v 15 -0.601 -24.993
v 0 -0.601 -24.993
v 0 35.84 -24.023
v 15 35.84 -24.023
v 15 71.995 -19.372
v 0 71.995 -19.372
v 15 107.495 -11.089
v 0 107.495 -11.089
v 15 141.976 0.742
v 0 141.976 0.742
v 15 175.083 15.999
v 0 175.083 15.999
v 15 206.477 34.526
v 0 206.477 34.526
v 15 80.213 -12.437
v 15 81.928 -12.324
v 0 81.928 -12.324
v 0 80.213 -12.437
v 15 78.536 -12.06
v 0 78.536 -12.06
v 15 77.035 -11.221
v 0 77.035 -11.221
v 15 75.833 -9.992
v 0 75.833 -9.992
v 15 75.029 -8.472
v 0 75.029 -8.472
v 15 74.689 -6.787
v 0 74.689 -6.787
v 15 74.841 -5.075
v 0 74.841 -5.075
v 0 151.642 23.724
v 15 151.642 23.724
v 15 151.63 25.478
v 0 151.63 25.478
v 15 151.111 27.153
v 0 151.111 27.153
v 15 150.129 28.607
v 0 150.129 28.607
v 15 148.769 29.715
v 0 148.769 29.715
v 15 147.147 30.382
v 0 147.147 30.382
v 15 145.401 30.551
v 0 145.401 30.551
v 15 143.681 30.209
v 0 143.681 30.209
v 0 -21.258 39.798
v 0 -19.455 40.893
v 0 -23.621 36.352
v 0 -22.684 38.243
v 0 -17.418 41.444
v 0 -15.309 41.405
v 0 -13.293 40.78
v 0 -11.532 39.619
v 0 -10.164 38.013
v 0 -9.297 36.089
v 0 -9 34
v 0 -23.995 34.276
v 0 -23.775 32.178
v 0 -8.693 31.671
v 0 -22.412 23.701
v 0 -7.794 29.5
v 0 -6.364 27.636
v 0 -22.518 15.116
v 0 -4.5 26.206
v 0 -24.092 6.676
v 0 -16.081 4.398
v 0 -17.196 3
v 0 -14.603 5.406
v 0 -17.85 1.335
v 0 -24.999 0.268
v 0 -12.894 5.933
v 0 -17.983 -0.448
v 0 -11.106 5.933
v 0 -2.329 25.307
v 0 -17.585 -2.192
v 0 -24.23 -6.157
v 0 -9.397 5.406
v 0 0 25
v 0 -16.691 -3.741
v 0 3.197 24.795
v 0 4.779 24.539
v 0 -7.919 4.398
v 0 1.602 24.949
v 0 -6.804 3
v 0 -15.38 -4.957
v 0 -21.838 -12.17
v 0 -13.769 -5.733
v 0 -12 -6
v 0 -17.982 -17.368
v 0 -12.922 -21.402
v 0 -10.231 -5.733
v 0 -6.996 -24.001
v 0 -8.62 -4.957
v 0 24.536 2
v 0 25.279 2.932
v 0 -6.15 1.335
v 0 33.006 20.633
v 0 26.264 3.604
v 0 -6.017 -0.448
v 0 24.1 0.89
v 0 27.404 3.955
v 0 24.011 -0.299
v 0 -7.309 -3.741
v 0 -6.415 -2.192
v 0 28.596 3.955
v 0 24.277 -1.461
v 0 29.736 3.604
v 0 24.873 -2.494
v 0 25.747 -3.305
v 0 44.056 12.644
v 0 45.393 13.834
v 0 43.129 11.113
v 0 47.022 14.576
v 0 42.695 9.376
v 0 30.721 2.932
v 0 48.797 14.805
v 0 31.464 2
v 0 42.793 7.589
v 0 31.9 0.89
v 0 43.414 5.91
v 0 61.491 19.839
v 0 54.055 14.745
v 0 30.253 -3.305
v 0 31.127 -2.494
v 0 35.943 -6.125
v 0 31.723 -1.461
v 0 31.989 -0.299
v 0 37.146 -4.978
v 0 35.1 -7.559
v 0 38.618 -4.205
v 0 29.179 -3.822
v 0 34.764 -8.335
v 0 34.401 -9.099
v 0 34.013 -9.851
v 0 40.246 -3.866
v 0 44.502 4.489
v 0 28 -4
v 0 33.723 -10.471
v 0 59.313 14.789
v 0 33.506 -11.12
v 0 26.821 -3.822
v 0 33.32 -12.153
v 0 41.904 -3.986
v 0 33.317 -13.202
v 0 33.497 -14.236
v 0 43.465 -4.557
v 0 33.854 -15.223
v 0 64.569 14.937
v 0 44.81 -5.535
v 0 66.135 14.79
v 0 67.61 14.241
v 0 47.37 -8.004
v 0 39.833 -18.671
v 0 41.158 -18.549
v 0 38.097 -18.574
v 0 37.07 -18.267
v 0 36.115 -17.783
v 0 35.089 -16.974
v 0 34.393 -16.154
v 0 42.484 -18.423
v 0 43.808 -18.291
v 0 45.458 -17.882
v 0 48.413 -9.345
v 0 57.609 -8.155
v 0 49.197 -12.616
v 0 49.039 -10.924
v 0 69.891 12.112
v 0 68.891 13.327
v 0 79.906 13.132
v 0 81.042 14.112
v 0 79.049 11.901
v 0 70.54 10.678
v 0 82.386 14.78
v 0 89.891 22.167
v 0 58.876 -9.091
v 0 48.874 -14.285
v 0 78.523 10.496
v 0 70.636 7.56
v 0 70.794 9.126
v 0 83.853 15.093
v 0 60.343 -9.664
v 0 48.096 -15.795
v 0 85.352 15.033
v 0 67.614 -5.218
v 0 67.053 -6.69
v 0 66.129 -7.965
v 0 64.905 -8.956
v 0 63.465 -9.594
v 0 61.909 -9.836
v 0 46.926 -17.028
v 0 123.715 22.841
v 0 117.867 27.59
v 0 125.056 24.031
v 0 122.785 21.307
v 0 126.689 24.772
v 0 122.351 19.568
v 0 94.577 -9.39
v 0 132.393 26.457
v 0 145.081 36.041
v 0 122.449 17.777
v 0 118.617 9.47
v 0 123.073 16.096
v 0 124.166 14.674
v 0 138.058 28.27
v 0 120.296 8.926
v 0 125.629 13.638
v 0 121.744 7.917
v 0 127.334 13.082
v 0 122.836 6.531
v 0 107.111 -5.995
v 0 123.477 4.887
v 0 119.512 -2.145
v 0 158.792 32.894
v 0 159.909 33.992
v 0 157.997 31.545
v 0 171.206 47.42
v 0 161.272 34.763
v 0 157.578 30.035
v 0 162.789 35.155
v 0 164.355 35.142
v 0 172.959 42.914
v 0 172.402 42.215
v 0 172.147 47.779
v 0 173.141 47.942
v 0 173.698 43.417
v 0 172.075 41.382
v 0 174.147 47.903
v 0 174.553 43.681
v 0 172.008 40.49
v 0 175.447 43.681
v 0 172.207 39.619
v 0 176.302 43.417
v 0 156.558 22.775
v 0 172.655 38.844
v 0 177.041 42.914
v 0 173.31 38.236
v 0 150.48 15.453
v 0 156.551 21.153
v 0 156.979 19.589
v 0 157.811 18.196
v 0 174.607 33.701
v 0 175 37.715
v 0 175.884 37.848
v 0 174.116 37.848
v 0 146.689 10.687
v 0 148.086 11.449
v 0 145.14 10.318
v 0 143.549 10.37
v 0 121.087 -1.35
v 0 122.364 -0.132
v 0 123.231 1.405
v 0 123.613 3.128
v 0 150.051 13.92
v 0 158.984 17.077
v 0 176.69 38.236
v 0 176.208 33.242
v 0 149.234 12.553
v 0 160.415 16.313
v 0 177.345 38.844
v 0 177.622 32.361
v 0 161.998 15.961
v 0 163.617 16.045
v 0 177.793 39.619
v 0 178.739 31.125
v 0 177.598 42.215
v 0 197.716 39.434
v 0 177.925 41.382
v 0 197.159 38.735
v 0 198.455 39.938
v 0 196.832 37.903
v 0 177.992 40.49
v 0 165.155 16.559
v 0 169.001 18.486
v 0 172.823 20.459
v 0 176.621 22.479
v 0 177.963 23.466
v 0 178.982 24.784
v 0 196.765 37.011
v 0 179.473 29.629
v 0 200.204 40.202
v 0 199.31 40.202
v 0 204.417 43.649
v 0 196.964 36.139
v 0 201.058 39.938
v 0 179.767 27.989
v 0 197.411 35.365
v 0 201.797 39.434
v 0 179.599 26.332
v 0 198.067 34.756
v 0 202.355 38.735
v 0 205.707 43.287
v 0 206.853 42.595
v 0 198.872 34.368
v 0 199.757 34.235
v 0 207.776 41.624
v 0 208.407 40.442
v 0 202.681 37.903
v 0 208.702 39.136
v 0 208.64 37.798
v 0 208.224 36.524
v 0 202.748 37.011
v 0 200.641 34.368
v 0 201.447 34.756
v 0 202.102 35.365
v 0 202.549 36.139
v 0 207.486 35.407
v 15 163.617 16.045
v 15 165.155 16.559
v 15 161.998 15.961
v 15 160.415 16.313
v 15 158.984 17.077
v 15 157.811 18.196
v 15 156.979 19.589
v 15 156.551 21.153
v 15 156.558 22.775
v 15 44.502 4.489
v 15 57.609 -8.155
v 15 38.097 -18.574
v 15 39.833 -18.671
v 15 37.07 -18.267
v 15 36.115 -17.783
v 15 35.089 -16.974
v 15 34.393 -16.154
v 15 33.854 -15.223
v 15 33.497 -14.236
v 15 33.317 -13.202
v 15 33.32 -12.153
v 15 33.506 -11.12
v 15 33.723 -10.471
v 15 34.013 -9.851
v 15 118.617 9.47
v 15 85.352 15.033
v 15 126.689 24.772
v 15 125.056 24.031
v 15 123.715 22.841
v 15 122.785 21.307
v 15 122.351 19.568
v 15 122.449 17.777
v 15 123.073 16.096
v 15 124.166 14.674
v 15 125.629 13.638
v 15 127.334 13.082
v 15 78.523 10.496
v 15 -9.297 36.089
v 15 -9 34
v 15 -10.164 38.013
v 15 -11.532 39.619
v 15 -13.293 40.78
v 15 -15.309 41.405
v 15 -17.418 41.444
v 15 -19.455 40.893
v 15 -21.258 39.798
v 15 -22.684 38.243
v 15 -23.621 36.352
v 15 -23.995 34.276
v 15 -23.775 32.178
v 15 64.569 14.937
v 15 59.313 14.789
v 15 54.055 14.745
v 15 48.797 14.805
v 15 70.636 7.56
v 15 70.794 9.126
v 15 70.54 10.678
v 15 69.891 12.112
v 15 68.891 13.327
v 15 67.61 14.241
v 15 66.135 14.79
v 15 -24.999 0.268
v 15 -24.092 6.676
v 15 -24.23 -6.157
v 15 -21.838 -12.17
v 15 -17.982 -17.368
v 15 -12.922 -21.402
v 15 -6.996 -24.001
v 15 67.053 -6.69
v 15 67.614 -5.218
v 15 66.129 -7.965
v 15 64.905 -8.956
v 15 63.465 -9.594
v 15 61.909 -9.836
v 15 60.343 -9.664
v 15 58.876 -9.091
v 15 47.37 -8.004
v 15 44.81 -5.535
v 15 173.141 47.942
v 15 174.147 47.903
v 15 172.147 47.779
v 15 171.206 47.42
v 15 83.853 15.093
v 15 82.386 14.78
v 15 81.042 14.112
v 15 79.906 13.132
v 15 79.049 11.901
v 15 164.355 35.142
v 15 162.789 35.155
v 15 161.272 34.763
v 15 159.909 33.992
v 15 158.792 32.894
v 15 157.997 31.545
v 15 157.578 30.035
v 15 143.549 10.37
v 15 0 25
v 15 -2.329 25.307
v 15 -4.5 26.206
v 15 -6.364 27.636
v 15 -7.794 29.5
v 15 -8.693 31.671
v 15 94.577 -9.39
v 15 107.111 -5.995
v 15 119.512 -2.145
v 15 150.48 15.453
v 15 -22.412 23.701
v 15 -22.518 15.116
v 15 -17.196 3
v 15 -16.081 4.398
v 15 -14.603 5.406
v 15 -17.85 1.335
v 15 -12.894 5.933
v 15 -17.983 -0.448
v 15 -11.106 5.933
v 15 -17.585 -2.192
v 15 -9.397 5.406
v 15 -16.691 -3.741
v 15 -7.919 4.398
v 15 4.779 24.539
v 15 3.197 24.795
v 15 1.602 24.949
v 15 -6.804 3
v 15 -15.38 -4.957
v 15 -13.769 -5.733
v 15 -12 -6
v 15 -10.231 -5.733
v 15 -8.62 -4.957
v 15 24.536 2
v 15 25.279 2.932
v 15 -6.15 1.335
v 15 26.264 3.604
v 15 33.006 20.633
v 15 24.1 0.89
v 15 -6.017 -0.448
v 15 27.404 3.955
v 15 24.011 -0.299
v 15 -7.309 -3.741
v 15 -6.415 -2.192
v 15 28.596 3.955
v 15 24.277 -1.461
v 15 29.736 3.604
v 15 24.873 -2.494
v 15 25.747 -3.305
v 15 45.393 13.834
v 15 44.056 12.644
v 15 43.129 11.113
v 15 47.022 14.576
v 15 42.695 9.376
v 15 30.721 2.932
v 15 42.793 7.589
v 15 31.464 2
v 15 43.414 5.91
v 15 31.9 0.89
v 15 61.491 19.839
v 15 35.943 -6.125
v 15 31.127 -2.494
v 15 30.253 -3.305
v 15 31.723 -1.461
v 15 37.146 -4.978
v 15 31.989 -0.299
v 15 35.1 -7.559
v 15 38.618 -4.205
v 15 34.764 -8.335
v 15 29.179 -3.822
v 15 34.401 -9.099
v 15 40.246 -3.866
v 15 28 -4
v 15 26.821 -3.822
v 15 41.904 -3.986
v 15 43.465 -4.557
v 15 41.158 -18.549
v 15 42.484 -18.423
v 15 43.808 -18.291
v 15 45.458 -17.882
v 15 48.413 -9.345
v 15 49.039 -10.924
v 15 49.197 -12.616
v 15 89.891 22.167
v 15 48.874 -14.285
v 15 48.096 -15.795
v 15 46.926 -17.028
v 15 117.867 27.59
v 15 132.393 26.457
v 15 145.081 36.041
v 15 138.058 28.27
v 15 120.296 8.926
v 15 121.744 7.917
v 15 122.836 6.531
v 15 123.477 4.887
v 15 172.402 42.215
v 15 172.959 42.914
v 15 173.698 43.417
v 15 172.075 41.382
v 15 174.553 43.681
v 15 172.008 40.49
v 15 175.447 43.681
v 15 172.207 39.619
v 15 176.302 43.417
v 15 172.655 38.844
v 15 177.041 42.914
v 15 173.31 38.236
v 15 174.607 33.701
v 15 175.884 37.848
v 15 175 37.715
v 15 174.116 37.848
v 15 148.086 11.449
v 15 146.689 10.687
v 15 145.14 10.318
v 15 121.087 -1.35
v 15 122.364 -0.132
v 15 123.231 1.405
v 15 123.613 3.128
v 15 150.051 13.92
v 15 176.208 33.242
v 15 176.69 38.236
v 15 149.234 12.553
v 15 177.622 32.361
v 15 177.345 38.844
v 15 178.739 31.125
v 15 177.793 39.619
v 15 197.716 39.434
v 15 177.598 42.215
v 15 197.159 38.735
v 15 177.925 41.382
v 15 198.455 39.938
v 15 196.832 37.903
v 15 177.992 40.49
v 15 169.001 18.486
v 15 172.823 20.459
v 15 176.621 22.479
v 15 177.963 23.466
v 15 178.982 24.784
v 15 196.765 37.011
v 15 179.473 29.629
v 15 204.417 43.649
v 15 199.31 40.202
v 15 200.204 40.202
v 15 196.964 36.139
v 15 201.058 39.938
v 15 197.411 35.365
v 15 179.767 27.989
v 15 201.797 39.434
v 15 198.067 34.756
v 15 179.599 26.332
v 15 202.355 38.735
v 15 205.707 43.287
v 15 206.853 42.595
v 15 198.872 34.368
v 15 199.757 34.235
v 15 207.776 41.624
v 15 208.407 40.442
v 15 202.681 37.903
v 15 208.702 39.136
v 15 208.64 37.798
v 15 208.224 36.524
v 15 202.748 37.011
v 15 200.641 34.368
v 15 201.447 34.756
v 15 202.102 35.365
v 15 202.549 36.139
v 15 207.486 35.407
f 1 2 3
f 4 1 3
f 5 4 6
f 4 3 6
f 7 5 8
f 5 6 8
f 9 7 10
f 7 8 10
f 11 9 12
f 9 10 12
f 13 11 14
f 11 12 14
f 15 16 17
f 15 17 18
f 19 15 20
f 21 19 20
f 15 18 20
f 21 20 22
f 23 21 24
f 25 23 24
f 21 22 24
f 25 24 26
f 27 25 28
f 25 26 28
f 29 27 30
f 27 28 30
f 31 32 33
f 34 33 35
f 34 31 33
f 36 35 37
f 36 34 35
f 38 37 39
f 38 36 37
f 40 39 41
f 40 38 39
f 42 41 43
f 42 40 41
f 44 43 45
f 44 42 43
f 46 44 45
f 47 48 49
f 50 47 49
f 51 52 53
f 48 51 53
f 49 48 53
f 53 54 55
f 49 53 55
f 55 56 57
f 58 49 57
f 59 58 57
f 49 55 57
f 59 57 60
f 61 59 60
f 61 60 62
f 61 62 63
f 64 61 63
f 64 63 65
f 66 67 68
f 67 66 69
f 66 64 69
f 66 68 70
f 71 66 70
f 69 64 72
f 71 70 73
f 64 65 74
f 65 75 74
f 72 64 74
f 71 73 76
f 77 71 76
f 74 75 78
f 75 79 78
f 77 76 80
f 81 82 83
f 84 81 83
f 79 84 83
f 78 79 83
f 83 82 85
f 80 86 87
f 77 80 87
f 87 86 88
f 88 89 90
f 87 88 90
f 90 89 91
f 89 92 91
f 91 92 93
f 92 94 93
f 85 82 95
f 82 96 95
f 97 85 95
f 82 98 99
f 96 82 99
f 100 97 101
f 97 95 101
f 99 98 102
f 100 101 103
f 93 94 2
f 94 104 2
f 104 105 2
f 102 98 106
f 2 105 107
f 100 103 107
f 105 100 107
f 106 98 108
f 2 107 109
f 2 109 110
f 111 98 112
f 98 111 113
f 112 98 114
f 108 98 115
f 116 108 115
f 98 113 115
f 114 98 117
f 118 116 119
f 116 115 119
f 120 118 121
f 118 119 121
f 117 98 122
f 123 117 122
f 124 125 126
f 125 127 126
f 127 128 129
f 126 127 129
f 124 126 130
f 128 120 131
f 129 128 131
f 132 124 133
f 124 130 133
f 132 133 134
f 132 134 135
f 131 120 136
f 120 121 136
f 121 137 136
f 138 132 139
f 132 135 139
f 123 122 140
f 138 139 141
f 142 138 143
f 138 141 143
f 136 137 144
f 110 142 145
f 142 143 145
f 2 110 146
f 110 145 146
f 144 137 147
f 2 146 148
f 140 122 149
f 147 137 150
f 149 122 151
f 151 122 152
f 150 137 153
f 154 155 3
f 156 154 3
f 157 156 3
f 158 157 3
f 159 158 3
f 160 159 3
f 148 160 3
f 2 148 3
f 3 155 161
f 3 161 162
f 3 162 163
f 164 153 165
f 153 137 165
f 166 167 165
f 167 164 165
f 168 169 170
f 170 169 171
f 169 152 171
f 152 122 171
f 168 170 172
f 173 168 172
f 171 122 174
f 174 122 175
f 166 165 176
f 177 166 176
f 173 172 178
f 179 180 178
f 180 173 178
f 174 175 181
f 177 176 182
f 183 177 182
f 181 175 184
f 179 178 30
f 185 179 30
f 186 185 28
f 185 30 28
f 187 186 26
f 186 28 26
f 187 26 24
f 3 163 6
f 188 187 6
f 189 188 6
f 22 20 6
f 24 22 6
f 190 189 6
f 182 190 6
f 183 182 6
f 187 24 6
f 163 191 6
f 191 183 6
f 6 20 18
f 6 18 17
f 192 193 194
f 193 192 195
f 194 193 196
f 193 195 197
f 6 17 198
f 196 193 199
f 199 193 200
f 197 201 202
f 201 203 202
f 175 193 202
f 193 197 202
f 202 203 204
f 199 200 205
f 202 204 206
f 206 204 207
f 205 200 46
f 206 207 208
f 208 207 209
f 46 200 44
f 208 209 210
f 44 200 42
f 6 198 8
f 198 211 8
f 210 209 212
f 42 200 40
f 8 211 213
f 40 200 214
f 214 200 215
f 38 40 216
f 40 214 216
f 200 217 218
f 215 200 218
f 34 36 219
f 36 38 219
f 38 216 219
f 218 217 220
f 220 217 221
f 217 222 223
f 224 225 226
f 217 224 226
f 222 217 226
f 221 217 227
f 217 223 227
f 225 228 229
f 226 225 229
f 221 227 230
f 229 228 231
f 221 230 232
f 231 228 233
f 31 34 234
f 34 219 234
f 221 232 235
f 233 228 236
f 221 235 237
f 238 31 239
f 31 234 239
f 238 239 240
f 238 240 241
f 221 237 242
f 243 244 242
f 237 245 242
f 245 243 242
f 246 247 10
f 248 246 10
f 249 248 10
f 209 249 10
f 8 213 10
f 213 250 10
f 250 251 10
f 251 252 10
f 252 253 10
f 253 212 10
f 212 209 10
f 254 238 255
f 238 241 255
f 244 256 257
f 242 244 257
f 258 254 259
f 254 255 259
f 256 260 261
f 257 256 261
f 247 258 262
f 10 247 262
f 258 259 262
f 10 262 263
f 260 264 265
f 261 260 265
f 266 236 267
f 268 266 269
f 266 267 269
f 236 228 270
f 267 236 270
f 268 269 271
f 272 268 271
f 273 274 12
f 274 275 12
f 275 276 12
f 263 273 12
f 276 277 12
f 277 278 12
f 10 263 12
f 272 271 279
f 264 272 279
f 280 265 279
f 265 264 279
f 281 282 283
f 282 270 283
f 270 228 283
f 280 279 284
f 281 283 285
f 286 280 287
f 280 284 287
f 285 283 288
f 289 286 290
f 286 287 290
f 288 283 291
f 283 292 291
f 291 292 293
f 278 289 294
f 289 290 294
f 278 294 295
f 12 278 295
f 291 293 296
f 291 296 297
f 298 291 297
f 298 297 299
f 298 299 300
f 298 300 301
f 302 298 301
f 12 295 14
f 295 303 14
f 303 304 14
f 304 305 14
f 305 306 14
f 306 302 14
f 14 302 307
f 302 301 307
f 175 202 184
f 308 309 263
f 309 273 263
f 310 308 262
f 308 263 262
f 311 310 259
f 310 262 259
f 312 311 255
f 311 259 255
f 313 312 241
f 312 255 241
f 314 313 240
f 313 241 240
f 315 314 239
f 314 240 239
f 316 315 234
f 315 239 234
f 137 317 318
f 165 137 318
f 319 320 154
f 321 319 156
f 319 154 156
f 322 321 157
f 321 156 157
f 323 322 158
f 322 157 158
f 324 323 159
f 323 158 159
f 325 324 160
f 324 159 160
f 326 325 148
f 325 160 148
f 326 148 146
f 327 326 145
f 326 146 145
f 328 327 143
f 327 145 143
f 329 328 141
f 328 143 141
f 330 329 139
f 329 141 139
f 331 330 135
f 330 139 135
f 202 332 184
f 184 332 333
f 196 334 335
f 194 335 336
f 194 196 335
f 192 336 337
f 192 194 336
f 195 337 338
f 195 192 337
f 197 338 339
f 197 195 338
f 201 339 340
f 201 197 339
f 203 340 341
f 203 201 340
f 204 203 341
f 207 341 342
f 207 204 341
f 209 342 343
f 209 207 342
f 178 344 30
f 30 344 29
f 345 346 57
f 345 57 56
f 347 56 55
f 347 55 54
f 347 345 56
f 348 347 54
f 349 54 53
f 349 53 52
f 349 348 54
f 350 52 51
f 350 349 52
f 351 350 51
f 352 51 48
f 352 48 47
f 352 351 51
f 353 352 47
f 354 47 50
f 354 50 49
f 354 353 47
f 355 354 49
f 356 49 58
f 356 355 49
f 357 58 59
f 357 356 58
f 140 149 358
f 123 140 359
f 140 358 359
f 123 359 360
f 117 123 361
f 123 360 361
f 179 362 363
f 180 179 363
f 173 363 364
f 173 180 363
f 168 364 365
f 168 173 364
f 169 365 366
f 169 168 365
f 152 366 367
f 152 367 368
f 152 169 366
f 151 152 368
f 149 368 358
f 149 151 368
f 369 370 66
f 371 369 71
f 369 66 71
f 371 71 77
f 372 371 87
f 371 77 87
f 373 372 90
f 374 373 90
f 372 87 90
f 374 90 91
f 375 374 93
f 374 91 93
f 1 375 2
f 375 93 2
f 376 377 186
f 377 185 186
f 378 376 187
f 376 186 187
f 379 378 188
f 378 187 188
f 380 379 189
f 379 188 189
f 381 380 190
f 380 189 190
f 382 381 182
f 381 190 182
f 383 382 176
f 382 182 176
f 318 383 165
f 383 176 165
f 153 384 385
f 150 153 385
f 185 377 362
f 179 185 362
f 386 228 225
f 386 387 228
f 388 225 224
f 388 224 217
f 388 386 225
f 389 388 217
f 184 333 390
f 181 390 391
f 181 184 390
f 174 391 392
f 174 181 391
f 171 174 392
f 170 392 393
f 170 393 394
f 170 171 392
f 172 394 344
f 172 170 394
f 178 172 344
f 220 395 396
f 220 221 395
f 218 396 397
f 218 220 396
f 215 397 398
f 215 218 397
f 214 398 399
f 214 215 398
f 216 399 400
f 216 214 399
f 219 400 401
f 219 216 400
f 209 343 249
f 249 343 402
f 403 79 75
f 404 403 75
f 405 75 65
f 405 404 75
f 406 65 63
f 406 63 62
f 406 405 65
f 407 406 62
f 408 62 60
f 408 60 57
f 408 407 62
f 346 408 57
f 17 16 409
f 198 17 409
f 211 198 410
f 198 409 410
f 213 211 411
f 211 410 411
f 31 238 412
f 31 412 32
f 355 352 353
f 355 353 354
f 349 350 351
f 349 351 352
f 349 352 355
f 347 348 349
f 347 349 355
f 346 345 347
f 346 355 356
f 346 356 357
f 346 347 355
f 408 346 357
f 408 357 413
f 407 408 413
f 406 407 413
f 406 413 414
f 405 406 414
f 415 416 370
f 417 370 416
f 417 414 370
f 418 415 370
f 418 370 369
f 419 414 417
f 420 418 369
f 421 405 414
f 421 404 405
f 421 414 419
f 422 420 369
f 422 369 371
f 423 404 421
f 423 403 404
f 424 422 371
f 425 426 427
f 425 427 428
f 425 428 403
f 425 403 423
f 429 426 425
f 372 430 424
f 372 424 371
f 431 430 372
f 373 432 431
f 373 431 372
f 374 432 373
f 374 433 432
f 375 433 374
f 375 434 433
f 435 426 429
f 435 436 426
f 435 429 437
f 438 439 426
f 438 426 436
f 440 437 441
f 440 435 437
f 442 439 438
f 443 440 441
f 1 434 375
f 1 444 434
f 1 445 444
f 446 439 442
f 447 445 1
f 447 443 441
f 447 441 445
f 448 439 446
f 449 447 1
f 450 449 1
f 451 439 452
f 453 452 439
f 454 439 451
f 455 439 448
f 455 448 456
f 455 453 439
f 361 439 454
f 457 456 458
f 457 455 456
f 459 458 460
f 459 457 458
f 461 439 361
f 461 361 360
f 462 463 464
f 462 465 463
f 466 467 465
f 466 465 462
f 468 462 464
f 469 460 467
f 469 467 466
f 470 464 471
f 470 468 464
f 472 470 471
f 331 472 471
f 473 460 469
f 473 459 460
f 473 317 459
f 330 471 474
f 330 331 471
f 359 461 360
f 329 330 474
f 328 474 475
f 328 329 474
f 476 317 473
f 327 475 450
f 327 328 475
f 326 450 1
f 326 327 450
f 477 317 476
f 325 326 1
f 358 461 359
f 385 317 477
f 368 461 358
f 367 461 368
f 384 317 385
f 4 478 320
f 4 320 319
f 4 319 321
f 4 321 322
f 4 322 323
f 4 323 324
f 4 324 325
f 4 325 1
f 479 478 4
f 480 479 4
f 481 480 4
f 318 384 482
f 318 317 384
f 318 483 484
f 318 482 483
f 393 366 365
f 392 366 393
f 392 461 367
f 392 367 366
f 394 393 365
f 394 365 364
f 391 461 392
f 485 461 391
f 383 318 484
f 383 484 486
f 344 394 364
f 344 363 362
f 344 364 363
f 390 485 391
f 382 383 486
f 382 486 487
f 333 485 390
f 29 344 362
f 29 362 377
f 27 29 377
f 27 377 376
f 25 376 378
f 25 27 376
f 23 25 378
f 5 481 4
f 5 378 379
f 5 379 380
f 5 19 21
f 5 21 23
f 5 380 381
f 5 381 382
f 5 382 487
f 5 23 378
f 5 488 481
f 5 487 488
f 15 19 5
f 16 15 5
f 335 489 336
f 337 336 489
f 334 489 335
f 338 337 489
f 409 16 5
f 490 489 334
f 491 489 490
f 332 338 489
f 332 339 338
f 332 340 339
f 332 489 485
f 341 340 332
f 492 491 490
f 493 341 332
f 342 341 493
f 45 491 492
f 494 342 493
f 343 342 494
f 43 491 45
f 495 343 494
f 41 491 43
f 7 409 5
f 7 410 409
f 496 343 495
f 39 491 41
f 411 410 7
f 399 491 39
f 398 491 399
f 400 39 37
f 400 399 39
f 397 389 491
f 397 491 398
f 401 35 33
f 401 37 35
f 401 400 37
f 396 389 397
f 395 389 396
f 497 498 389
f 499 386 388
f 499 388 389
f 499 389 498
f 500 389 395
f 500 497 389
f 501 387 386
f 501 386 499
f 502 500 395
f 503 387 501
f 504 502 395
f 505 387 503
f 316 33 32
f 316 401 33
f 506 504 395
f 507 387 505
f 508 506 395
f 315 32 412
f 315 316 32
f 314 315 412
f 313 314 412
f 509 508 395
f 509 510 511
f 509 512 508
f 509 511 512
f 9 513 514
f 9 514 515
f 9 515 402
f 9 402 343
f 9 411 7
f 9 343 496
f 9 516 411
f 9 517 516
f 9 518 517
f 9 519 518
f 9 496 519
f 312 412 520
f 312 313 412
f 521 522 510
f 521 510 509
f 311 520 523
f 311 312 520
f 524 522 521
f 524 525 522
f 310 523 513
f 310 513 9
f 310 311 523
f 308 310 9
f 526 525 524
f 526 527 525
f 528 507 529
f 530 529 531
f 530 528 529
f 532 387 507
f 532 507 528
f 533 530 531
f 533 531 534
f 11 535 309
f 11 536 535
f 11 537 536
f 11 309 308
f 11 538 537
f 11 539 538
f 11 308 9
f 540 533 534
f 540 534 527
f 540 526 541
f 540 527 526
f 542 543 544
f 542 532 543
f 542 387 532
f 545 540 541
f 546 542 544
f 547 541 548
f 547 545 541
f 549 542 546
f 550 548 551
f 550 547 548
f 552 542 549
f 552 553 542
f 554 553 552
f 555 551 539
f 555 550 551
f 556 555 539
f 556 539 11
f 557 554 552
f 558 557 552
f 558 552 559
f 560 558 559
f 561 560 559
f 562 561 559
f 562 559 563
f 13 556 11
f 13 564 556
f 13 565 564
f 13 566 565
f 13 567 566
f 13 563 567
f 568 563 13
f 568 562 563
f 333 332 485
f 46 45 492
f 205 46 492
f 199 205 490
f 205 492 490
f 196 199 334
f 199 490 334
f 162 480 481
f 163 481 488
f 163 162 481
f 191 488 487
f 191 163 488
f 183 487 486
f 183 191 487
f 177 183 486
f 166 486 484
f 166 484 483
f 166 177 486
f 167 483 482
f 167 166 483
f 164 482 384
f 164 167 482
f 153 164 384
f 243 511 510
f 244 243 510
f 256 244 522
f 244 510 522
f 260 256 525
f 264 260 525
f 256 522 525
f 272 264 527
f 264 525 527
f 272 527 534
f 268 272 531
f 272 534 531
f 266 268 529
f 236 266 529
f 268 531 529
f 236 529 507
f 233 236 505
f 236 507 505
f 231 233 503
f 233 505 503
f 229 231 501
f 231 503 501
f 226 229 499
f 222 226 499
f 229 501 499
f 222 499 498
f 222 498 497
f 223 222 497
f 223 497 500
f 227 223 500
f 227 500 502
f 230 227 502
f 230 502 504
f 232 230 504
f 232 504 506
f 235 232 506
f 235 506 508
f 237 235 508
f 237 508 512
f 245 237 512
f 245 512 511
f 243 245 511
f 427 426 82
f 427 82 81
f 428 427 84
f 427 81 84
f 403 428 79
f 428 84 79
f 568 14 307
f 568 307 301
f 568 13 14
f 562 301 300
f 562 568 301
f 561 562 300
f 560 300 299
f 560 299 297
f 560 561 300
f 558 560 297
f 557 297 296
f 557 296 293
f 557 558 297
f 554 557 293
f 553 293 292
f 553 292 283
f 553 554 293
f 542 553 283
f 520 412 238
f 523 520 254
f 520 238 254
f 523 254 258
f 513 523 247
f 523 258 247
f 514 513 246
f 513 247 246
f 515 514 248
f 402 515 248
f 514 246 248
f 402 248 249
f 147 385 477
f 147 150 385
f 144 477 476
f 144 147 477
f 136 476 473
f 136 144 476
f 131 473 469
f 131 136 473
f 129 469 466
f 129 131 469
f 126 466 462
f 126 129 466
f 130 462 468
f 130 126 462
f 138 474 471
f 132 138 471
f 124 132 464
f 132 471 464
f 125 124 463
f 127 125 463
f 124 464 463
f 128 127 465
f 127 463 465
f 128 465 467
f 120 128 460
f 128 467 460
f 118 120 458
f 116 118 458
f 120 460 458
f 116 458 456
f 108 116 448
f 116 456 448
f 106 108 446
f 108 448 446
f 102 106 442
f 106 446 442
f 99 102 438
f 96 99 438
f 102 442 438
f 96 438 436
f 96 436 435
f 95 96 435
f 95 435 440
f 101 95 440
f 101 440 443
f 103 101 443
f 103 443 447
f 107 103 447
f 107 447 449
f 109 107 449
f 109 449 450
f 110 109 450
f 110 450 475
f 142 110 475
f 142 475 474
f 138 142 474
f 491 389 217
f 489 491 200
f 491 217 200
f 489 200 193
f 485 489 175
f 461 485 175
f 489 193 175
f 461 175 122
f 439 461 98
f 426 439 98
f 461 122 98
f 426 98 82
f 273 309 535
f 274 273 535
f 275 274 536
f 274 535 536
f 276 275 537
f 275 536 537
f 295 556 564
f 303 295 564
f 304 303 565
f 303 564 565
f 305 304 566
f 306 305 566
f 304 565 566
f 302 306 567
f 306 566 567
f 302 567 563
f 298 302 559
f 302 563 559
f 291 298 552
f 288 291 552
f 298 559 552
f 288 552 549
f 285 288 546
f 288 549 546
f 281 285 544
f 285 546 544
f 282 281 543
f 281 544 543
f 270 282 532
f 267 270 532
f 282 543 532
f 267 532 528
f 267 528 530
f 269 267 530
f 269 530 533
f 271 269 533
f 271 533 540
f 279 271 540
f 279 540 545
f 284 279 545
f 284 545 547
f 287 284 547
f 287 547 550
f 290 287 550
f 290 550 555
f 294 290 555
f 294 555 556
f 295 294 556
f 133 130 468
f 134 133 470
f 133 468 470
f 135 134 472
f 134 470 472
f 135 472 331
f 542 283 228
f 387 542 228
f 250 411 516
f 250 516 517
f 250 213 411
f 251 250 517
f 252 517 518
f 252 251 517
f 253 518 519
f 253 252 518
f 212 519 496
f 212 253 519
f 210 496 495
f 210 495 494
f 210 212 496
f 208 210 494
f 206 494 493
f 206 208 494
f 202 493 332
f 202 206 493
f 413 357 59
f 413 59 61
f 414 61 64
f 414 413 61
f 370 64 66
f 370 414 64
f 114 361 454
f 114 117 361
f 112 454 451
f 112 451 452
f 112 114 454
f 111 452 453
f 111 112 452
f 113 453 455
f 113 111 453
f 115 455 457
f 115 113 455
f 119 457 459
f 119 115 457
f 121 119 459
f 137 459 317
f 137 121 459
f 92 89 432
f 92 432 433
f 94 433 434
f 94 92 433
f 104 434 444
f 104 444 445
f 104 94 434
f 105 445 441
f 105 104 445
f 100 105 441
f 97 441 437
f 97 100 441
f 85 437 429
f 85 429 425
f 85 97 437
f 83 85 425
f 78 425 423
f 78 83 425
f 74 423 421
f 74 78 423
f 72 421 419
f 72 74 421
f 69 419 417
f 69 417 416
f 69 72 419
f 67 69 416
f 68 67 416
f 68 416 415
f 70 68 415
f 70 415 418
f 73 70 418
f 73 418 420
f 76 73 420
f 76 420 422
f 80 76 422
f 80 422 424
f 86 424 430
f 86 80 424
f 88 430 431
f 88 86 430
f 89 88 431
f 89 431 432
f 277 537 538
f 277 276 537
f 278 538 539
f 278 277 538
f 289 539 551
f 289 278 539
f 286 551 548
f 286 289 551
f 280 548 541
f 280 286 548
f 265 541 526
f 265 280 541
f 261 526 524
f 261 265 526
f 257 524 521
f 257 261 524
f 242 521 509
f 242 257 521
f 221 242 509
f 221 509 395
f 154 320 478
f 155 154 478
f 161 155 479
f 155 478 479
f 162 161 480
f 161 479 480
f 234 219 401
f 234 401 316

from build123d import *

# Parameters (mm, degrees)
SKETCH1_R           = 6
BOSS_EXTRUDE1_DEPTH = 15
SKETCH2_R           = 4
CUT_EXTRUDE1_DEPTH  = 16
SKETCH3_R           = 3
CUT_EXTRUDE2_DEPTH  = 16
CUT_EXTRUDE3_DEPTH  = 16
FILLET1_R           = 6
SKETCH5_R           = 7.5
BOSS_EXTRUDE2_DEPTH = 15
FILLET2_R           = 5


with BuildPart() as part:
    # Sketch1 → Boss-Extrude1 (new body)
    with BuildSketch(Plane(origin=(0, 0, 0), x_dir=(0, 0, -1), z_dir=(1, 0, 0))):
        with BuildLine():
            ThreePointArc((24.992781164, -0.60074095), (9.243822678, 113.703988064), (-41.858816097, 217.155044504))
            Line((-41.858816097, 217.155044504), (-48.12160564, 172.59298141))
            ThreePointArc((-48.12160564, 172.59298141), (-22.274376436, 90.661190514), (-24.538993202, 4.778892408))
            ThreePointArc((-24.538993202, 4.778892408), (2.400538477, 24.88448141), (25, 0))
            ThreePointArc((25, 0), (24.998195226, -0.30039216), (24.992781164, -0.60074095))
        make_face()
        with BuildLine():
            ThreePointArc((-24.538993202, 4.778892408), (-2.699369305, -24.853840857), (24.992781164, -0.60074095))
            ThreePointArc((24.992781164, -0.60074095), (24.998195226, -0.30039216), (25, 0))
            ThreePointArc((25, 0), (2.400538477, 24.88448141), (-24.538993202, 4.778892408))
        make_face()
        with Locations((0, -12)):
            Circle(SKETCH1_R, mode=Mode.SUBTRACT)
    extrude(amount=BOSS_EXTRUDE1_DEPTH)

    # Sketch2 → Cut-Extrude1 (cut, through all)
    with BuildSketch(Plane(origin=(15, 0, 0), x_dir=(0, 0, -1), z_dir=(1, 0, 0))):
        with Locations((0, 28)):
            Circle(SKETCH2_R)
    extrude(amount=-CUT_EXTRUDE1_DEPTH, mode=Mode.SUBTRACT)

    # Sketch3 → Cut-Extrude2 (cut, through all)
    with BuildSketch(Plane(origin=(15, 0, 0), x_dir=(0, 0, -1), z_dir=(1, 0, 0))):
        with Locations((-40.714528231, 175)):
            Circle(SKETCH3_R)
        with Locations((-37.235200707, 199.756701719)):
            Circle(SKETCH3_R)
    extrude(amount=-CUT_EXTRUDE2_DEPTH, mode=Mode.SUBTRACT)

    # Sketch4 → Cut-Extrude3 (cut, through all)
    with BuildSketch(Plane(origin=(15, 0, 0), x_dir=(0, 0, -1), z_dir=(1, 0, 0))):
        with BuildLine():
            ThreePointArc((-11.749836025, 155.008629259), (-20.960958666, 173.77628952), (-31.260870979, 191.969190837))
            Line((-31.260870979, 191.969190837), (-35.976814508, 158.413509038))
            Line((-35.976814508, 158.413509038), (-11.749836025, 155.008629259))
        make_face()
        with BuildLine():
            Line((-9.354323007, 149.622823998), (-33.760235475, 153.052851308))
            ThreePointArc((-33.760235475, 153.052851308), (-24.416431689, 125.419954523), (-18.166319592, 96.927503721))
            Line((-18.166319592, 96.927503721), (-9.354323007, 149.622823998))
        make_face()
        with BuildLine():
            ThreePointArc((14.161868129, 72.691486719), (5.930300275, 107.334766496), (-5.730334656, 140.979158838))
            Line((-5.730334656, 140.979158838), (-15.958464631, 79.815428272))
            Line((-15.958464631, 79.815428272), (14.161868129, 72.691486719))
        make_face()
        with BuildLine():
            Line((15.468075791, 65.189422352), (-15.356589243, 72.479949778))
            ThreePointArc((-15.356589243, 72.479949778), (-14.750380465, 52.717361117), (-15.619336812, 32.964581198))
            Line((-15.619336812, 32.964581198), (15.468075791, 65.189422352))
        make_face()
        with BuildLine():
            ThreePointArc((19.721068997, 24.377203305), (18.614609922, 40.455333735), (16.779570125, 56.466678425))
            Line((16.779570125, 56.466678425), (-2, 37))
            ThreePointArc((-2, 37), (10.561248293, 33.615157675), (19.721068997, 24.377203305))
        make_face()
    extrude(amount=-CUT_EXTRUDE3_DEPTH, mode=Mode.SUBTRACT)

    # Fillet1
    fillet1_edges = [part.edges().sort_by_distance(p)[0] for p in [
        (7.5, 155.008629259, 11.749836025),
        (7.5, 158.413509038, 35.976814508),
        (7.5, 191.969190837, 31.260870979),
        (7.5, 96.927503721, 18.166319592),
        (7.5, 153.052851308, 33.760235475),
        (7.5, 149.622823998, 9.354323007),
        (7.5, 72.691486719, -14.161868129),
        (7.5, 79.815428272, 15.958464631),
        (7.5, 140.979158838, 5.730334656),
        (7.5, 32.964581198, 15.619336812),
        (7.5, 72.479949778, 15.356589243),
        (7.5, 65.189422352, -15.468075791),
        (7.5, 24.377203305, -19.721068997),
        (7.5, 37, 2),
        (7.5, 56.466678425, -16.779570125),
    ]]
    fillet(fillet1_edges, radius=FILLET1_R)

    # Sketch5 → Boss-Extrude2 (add)
    with BuildSketch(Plane(origin=(15, 0, 0), x_dir=(0, 0, -1), z_dir=(1, 0, 0))):
        with BuildLine():
            ThreePointArc((-34, -9), (-28.696699141, -11.196699141), (-26.5, -16.5))
            ThreePointArc((-26.5, -16.5), (-28.087357429, -21.114180081), (-32.177508753, -23.775199355))
            ThreePointArc((-32.177508753, -23.775199355), (-19.40613231, -22.280390349), (-6.675855702, -24.092176129))
            ThreePointArc((-6.675855702, -24.092176129), (-19.898447082, -15.134457497), (-25, 0))
            ThreePointArc((-25, 0), (-27.636038969, -6.363961031), (-34, -9))
        make_face()
        with Locations((-34, -16.5)):
            Circle(SKETCH5_R)
    extrude(amount=-BOSS_EXTRUDE2_DEPTH)

    # Fillet2
    fillet2_edges = [part.edges().sort_by_distance(p)[0] for p in [
        (7.5, 172.59298141, 48.12160564),
        (7.5, 217.155044504, 41.858816097),
    ]]
    fillet(fillet2_edges, radius=FILLET2_R)


solid = part.part
